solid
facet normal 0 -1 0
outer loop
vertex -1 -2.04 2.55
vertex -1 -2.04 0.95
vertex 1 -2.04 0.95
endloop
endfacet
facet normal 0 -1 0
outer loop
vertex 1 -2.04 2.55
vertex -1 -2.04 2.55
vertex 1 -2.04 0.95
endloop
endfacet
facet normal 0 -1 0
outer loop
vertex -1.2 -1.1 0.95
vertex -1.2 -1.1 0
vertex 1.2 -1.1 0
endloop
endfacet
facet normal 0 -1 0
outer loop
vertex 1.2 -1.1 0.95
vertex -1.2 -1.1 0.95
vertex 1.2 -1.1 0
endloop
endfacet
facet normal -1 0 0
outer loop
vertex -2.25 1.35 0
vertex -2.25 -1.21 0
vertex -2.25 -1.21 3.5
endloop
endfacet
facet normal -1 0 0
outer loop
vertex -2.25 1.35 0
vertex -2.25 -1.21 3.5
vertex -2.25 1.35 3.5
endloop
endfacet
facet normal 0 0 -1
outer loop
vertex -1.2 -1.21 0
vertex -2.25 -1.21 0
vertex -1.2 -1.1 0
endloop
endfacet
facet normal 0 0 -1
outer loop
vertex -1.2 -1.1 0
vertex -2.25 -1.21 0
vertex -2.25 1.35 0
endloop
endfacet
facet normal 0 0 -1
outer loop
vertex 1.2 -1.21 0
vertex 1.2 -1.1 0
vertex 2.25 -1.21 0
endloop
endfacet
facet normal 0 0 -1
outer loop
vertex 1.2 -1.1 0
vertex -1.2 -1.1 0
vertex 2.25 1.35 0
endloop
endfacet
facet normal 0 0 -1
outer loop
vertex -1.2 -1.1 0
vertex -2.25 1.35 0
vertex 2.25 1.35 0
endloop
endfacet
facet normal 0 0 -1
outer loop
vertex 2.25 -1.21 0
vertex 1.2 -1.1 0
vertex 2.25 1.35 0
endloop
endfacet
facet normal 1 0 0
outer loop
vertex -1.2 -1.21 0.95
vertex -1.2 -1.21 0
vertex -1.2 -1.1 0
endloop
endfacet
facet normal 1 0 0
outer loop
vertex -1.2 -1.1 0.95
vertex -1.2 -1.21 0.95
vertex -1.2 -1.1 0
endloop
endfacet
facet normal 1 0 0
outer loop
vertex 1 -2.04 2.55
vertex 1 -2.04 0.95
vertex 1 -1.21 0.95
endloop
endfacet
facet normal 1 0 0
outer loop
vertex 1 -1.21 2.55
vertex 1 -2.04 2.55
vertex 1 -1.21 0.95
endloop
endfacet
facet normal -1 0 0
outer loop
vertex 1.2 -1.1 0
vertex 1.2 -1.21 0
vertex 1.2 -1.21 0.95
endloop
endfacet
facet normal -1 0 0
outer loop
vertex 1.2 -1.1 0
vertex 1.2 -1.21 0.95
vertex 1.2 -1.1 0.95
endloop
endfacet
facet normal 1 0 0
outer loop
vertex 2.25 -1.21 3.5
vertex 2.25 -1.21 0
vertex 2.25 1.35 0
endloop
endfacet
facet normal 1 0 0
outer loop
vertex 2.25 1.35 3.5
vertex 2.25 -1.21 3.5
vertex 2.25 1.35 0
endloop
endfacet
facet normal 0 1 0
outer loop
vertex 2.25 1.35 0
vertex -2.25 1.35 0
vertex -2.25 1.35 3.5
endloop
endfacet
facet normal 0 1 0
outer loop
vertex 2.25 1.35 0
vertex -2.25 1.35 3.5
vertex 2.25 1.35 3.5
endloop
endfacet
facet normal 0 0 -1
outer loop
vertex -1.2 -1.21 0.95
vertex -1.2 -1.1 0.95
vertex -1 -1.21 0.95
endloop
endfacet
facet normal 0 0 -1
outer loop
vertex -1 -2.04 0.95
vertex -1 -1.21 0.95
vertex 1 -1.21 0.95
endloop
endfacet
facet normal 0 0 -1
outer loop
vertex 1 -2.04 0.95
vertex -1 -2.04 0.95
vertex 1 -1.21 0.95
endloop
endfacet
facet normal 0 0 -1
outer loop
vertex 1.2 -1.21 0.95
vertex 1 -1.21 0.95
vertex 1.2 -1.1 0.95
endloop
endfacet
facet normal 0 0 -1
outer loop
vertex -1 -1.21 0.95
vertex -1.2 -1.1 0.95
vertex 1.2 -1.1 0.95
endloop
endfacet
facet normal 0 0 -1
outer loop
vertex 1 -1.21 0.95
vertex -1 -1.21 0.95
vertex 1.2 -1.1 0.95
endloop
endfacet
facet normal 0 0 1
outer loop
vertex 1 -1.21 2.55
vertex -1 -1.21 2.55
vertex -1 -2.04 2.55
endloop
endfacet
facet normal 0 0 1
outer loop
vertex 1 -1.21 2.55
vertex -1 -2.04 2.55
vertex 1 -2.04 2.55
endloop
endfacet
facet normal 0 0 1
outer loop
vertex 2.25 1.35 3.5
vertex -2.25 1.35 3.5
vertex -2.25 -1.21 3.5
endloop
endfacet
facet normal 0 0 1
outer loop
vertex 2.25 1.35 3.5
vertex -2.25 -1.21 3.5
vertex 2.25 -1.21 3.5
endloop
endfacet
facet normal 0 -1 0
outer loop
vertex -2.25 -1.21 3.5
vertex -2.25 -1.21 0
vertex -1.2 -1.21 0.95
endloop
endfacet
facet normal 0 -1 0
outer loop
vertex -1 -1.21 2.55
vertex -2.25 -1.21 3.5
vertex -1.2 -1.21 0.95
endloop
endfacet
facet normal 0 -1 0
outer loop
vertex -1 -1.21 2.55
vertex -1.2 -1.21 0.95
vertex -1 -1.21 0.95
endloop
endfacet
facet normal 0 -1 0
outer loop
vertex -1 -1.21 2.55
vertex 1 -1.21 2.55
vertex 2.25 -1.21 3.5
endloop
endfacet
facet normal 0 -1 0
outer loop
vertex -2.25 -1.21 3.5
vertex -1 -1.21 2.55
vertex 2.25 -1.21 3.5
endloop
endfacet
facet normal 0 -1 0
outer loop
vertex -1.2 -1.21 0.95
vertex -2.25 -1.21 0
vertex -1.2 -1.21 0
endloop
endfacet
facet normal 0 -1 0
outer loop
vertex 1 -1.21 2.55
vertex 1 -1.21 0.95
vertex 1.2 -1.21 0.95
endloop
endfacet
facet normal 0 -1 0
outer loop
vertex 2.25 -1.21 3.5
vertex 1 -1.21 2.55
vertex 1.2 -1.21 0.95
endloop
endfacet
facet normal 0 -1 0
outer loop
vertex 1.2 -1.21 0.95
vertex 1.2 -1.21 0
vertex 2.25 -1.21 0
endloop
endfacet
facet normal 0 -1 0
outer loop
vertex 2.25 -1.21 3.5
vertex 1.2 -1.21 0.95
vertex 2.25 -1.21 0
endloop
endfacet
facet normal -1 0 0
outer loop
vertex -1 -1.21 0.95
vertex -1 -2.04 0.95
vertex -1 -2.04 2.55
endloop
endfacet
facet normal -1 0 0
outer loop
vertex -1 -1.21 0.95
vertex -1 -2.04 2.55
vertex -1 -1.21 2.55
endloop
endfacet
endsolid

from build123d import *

# Parameters (mm, degrees)
SKETCH_1_W           = 4.5
SKETCH_1_H           = 2.56
BODY_DEPTH           = 3.5
SKETCH_2_W           = 2
SKETCH_2_H           = 0.83
STEM_FULL_DEPTH      = 2.55
SKETCH_3_W           = 2.4
SKETCH_3_H           = 1.1
STEM_LOWER_GAP_DEPTH = 0.95


with BuildPart() as part:
    # 草圖1 → body (new body)
    with BuildSketch(Plane.XY):
        with Locations((0, 0.07)):
            Rectangle(SKETCH_1_W, SKETCH_1_H)
    extrude(amount=BODY_DEPTH)

    # 草圖2 → stem full (add)
    with BuildSketch(Plane.XY):
        with Locations((0, -1.625)):
            Rectangle(SKETCH_2_W, SKETCH_2_H)
    extrude(amount=STEM_FULL_DEPTH)

    # 草圖3 → stem lower gap (cut)
    with BuildSketch(Plane.XY):
        with Locations((0, -1.65)):
            Rectangle(SKETCH_3_W, SKETCH_3_H)
    extrude(amount=STEM_LOWER_GAP_DEPTH, mode=Mode.SUBTRACT)


solid = part.part
